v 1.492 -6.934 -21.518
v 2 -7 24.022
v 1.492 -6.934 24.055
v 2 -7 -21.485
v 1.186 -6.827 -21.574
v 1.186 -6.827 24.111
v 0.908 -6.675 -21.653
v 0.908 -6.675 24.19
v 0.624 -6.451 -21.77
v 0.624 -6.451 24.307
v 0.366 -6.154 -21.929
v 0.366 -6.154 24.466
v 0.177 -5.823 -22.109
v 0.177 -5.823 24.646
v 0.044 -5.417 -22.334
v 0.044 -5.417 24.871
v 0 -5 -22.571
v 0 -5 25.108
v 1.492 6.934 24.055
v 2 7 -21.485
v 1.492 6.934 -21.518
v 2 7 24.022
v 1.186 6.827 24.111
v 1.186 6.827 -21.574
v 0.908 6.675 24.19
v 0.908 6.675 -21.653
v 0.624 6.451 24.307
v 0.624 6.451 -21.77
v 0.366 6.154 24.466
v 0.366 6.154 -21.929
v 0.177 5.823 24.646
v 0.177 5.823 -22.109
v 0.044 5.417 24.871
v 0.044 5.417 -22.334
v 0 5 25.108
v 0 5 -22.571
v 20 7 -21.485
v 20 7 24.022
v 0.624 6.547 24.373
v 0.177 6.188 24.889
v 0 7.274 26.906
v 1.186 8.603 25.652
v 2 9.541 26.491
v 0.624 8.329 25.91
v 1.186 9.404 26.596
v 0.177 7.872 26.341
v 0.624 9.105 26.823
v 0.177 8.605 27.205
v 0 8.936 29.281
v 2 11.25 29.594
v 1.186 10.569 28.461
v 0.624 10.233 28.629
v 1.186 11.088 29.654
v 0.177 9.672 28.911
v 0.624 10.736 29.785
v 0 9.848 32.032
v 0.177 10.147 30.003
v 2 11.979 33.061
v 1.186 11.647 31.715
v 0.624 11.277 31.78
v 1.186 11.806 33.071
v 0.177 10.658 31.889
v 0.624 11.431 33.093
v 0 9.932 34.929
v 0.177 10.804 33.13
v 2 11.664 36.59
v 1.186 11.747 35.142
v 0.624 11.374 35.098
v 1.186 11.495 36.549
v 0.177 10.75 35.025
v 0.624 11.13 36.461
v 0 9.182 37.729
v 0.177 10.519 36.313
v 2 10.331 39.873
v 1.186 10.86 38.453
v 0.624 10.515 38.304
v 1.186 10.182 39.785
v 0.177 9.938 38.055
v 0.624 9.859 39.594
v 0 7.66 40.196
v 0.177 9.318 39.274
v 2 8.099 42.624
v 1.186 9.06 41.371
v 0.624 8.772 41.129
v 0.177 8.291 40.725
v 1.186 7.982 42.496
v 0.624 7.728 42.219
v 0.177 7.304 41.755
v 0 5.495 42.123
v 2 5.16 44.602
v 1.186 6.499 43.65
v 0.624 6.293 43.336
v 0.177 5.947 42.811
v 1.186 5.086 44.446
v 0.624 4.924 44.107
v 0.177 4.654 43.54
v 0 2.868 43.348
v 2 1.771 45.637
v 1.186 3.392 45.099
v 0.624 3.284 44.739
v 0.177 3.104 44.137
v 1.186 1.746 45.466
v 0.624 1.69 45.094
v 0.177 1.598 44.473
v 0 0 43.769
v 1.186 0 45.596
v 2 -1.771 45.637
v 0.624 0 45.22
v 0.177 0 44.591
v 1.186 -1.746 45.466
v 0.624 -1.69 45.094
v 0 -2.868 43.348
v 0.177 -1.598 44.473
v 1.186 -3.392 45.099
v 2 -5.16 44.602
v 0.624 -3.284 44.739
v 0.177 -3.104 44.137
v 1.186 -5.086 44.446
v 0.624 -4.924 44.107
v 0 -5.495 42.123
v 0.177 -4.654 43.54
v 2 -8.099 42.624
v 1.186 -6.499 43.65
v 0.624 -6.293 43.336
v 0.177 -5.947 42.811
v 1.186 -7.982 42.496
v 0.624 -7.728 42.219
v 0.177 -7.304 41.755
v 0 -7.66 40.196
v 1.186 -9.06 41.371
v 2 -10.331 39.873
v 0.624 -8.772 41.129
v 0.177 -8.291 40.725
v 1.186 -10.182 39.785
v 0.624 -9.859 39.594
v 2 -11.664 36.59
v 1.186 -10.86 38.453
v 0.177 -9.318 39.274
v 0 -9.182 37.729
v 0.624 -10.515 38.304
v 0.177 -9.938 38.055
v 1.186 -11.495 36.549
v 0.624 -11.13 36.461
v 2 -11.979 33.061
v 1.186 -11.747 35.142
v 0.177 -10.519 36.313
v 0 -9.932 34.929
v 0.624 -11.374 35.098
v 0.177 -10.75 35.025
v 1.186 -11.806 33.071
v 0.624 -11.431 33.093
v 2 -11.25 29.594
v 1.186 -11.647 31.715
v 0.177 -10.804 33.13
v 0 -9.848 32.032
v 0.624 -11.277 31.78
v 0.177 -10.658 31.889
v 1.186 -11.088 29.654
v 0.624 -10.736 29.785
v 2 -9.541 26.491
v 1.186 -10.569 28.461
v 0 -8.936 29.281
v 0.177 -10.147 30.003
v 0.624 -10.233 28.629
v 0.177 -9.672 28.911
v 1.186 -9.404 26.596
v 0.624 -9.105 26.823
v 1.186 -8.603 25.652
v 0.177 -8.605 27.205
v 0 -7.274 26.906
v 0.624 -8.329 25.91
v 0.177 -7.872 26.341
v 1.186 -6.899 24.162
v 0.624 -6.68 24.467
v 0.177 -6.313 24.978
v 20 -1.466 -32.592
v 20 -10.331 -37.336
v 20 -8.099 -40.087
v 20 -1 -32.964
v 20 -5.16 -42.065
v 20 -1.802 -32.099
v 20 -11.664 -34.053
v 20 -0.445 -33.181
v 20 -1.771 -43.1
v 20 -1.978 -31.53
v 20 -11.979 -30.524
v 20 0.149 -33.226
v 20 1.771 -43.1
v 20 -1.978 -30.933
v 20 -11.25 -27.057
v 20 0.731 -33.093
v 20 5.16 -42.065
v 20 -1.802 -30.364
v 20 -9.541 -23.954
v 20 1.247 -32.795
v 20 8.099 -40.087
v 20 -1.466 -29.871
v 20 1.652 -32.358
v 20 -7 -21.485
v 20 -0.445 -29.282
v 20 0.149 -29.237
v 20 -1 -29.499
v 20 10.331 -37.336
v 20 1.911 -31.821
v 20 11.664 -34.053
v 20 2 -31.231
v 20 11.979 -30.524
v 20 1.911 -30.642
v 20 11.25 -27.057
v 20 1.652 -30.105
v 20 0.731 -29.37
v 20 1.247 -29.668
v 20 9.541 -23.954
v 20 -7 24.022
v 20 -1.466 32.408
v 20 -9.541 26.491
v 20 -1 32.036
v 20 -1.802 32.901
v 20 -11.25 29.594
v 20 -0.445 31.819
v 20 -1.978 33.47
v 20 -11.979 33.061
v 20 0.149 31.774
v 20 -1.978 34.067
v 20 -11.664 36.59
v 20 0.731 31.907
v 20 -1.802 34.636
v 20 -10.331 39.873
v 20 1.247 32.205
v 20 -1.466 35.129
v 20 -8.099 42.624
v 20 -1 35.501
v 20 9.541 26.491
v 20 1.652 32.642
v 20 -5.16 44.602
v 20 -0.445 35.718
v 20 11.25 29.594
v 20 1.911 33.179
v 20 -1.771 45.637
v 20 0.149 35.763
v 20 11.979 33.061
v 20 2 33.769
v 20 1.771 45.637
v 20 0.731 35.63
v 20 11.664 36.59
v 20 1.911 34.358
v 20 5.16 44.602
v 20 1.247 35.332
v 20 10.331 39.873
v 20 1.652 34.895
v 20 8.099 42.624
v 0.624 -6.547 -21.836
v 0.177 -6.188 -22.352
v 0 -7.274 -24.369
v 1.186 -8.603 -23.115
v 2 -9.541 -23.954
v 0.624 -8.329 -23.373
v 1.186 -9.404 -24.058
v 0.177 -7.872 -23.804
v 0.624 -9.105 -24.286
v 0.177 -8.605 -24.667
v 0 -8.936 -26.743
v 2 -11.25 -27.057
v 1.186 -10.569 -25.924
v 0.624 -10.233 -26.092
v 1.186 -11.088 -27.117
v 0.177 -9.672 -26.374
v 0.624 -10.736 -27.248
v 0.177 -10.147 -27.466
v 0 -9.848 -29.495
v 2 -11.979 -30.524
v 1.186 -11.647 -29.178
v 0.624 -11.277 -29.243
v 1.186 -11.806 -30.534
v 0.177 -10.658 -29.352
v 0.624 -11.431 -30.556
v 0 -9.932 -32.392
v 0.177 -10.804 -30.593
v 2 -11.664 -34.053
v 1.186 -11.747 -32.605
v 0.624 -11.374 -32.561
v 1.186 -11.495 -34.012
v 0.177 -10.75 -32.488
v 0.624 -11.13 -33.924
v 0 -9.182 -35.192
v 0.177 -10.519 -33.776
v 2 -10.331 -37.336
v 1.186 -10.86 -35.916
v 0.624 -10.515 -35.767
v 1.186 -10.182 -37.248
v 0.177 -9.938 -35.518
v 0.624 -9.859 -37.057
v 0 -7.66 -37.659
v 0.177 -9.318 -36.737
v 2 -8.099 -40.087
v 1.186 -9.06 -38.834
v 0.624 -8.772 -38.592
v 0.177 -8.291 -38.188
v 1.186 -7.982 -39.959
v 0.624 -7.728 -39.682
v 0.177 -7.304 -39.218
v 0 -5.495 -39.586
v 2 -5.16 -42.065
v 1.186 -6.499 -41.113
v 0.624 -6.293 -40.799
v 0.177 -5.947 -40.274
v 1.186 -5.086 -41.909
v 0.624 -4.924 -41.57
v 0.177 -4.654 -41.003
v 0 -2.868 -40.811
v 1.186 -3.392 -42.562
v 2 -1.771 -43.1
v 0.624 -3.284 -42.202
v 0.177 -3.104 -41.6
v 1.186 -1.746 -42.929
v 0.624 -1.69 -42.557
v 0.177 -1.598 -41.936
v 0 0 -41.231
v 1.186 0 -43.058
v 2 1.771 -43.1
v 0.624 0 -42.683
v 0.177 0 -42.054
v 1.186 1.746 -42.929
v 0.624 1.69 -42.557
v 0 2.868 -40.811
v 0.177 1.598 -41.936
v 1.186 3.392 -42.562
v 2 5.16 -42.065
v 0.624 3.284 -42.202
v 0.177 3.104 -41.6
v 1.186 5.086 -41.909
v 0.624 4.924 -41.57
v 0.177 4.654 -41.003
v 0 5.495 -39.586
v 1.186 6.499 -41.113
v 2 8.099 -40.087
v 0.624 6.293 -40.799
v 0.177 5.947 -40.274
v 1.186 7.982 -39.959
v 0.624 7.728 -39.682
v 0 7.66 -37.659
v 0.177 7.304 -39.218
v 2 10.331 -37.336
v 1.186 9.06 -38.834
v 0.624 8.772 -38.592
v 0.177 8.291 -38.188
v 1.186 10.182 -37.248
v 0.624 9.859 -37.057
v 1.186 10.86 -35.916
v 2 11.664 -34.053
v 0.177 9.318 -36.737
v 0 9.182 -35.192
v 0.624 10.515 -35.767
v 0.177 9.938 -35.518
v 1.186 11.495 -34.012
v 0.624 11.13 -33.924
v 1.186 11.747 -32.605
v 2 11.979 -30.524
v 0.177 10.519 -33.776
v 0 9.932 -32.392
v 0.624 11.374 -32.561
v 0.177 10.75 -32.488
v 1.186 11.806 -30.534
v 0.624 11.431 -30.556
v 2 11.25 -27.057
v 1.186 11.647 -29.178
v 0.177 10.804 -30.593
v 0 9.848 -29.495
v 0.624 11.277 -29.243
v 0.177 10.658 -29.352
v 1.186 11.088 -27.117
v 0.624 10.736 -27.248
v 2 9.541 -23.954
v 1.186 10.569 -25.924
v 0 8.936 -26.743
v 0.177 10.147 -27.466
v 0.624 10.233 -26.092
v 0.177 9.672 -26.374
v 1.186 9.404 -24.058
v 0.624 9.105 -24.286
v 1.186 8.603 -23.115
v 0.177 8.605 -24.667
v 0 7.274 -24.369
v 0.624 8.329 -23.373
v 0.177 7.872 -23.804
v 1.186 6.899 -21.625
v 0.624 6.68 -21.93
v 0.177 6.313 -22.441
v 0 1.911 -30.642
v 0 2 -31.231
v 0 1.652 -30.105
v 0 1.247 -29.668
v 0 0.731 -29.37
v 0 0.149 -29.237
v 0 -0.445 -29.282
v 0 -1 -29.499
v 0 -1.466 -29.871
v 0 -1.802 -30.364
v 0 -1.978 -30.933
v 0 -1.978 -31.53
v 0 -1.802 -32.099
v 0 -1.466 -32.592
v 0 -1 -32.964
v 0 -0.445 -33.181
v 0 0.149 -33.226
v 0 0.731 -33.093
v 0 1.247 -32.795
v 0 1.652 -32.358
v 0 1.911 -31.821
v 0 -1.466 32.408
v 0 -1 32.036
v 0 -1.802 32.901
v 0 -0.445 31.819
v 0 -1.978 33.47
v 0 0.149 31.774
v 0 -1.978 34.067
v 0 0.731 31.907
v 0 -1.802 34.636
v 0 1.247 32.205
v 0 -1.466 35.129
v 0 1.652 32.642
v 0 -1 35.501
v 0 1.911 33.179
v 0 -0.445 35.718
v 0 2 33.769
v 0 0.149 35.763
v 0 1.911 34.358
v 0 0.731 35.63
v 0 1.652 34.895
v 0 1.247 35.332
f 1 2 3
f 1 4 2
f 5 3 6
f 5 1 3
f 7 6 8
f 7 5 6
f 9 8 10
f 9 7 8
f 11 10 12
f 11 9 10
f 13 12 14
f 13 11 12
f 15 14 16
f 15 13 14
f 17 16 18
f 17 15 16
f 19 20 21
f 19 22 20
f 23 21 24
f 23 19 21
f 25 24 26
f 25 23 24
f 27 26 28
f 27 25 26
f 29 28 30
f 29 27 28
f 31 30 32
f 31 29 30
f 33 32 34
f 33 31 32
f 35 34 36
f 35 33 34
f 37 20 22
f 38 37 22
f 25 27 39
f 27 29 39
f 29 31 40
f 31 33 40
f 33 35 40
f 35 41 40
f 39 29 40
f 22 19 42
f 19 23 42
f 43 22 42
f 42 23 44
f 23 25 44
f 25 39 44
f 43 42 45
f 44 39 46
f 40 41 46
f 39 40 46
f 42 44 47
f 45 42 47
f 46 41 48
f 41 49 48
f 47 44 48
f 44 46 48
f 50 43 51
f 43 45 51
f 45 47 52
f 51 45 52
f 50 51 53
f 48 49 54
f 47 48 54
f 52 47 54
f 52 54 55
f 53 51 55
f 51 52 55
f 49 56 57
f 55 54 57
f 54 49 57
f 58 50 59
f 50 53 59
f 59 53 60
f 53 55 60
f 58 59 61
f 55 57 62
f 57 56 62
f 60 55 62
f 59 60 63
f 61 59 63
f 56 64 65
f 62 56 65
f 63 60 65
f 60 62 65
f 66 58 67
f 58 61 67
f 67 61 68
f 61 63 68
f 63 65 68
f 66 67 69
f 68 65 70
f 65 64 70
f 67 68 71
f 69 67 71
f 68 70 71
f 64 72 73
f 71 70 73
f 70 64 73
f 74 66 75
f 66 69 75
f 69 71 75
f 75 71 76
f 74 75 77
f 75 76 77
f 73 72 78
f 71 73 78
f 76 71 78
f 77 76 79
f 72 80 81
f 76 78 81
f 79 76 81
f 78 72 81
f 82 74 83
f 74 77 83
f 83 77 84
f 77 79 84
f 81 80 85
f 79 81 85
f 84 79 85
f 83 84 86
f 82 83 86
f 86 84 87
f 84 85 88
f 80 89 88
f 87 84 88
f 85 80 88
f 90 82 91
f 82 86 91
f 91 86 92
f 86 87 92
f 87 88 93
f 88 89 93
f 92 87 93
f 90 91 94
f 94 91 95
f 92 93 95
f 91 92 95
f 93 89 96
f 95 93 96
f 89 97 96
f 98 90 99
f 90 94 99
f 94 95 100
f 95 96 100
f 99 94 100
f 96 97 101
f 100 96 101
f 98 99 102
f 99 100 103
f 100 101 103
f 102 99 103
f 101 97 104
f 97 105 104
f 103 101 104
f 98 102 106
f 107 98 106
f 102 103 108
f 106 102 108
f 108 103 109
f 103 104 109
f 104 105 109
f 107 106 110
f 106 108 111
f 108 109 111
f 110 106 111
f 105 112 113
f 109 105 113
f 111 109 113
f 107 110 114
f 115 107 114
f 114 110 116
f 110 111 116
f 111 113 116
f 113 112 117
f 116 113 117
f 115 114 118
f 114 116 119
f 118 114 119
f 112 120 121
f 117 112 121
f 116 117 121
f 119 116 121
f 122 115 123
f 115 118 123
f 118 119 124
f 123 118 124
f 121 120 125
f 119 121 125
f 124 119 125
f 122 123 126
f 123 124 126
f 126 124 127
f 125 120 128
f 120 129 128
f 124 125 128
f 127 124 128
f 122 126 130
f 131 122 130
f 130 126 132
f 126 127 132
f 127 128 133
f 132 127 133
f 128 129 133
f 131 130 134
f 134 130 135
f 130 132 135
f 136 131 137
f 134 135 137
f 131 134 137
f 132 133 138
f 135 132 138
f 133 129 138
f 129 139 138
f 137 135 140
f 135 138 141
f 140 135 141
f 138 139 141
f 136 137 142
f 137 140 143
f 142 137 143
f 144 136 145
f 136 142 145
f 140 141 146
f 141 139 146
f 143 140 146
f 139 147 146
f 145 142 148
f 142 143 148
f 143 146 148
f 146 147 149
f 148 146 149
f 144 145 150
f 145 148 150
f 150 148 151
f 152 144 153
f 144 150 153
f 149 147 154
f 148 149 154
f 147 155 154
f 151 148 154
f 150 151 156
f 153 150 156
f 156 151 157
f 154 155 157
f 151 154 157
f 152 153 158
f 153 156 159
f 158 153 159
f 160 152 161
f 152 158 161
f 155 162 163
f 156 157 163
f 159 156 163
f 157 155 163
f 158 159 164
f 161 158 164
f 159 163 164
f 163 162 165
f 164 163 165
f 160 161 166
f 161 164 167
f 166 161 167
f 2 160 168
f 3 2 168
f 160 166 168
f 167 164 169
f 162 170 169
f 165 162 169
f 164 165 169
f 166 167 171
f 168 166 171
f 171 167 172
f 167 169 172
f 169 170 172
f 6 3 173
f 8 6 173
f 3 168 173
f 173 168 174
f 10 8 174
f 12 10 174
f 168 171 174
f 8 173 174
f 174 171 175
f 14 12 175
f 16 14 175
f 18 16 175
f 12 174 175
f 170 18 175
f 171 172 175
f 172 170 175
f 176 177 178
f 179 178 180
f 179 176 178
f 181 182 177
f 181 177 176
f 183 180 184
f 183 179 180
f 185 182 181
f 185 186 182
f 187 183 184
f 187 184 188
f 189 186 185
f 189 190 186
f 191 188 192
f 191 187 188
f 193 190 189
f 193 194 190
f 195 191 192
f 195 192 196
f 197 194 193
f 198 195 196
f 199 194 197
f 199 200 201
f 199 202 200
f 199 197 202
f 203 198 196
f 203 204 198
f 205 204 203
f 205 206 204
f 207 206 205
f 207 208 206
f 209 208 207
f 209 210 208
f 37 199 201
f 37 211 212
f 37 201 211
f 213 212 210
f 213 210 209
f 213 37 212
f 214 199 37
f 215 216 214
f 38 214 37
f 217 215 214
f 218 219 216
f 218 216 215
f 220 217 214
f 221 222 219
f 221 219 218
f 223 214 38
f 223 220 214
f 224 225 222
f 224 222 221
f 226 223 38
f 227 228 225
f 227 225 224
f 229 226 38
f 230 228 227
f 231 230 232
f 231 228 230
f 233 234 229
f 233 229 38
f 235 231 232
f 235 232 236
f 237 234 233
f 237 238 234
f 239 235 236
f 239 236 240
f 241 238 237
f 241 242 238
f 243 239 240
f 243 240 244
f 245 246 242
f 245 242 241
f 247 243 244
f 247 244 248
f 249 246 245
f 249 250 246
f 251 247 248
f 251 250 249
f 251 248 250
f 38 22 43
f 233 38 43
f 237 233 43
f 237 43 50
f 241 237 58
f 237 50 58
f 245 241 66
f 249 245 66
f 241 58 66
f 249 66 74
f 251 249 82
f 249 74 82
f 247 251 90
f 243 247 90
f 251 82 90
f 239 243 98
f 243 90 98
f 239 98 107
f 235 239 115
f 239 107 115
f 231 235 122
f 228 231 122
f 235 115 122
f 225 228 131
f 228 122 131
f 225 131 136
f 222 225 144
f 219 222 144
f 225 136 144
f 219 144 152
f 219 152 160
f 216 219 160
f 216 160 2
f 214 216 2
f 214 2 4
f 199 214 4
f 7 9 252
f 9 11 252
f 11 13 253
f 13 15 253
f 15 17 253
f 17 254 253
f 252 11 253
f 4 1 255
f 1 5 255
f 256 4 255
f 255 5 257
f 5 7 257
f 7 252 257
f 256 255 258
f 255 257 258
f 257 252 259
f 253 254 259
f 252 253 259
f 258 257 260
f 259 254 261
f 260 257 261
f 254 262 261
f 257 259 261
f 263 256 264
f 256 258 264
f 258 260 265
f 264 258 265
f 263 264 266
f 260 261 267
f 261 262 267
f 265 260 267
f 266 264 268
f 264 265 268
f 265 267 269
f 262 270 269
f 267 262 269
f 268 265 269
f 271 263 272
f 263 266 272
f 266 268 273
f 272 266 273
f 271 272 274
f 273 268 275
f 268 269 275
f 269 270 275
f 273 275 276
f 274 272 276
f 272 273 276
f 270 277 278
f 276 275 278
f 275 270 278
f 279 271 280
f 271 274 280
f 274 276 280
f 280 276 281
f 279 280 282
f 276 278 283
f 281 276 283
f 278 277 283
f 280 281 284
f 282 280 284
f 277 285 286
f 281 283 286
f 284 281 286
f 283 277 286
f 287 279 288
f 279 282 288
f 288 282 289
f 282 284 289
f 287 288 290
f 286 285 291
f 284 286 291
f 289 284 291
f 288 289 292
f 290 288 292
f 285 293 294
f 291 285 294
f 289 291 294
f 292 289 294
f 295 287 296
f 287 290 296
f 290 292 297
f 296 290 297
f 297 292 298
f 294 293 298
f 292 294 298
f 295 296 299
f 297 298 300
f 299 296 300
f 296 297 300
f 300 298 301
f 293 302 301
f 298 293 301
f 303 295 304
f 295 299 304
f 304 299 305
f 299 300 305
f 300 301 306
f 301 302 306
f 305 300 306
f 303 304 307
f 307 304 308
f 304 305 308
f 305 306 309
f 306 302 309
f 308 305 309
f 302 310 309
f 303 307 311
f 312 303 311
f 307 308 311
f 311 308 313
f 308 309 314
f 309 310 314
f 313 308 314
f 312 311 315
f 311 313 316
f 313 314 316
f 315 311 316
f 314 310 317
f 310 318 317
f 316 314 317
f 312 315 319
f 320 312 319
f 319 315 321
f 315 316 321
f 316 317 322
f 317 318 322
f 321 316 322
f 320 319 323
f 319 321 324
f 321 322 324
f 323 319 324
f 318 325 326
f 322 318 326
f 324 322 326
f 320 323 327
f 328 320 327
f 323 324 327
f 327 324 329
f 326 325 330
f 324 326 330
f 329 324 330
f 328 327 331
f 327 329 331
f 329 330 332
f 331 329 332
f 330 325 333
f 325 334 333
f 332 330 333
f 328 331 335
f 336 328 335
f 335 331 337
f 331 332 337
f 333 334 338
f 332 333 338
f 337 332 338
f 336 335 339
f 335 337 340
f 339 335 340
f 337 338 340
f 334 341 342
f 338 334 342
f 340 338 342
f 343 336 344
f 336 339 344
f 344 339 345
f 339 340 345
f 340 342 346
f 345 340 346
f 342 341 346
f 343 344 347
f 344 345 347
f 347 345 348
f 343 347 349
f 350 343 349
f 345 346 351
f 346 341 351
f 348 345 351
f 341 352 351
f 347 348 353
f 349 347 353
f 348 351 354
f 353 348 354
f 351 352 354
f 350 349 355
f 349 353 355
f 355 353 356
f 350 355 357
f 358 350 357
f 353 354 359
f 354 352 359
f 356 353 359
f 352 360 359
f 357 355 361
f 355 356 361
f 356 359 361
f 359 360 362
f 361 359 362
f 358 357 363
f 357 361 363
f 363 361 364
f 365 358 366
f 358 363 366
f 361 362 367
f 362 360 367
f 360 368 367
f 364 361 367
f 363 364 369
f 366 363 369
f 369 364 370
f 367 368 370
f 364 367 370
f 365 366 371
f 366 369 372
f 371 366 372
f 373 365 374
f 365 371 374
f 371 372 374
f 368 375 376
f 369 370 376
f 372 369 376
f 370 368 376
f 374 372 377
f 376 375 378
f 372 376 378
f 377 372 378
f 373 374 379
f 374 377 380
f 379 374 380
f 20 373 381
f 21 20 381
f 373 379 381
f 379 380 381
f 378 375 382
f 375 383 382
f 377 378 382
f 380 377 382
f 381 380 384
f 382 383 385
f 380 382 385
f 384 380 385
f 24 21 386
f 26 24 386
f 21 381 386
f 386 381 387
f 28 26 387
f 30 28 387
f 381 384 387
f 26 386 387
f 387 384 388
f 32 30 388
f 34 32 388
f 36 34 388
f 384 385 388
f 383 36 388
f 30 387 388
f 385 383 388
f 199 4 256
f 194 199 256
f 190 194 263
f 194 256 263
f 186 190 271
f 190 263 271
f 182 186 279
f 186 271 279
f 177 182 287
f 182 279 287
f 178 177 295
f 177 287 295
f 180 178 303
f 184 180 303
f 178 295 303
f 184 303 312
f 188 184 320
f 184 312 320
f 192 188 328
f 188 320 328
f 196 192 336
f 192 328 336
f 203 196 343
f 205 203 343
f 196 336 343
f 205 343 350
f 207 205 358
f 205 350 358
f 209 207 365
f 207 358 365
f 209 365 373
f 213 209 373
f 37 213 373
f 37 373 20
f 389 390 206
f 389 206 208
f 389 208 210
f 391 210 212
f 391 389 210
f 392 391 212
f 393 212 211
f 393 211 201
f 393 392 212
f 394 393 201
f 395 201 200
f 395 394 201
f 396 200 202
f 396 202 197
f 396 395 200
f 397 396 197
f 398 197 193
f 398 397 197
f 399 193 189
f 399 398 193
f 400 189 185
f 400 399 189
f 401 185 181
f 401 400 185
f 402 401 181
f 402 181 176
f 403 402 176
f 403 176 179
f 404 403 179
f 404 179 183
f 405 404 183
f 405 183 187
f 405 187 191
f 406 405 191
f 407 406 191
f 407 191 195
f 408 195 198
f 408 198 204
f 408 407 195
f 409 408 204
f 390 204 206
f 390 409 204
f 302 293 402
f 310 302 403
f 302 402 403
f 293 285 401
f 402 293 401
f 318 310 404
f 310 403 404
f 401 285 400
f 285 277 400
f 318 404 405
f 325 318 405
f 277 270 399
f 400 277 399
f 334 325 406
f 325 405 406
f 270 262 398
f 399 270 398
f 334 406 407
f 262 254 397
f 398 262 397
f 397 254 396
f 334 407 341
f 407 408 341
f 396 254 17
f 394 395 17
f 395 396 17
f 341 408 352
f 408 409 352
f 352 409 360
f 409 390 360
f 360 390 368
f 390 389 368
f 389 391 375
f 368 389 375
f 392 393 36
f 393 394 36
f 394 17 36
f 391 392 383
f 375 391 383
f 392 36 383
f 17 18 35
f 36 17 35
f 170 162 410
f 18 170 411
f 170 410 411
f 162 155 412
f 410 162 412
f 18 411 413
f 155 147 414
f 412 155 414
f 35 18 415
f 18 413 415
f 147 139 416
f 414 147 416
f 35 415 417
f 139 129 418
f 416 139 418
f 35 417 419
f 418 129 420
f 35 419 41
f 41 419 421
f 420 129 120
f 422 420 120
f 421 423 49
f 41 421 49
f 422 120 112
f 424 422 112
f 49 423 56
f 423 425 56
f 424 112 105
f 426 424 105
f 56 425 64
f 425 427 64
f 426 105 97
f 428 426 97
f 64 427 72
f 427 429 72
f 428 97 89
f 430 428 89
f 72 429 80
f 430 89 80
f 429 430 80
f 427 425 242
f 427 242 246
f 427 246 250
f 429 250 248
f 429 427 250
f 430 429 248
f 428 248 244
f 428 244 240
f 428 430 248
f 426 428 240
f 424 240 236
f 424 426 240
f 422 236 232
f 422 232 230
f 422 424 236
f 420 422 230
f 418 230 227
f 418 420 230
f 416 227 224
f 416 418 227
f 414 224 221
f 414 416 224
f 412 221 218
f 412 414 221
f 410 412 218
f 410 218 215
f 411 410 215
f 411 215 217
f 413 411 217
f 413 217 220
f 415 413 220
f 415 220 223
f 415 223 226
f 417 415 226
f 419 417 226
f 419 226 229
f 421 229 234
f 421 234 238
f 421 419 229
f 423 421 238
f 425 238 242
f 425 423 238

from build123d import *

# Parameters (mm, degrees)
F0_R     = 2
F1_DEPTH = 20
F2_R     = 2


with BuildPart() as f1:
    # F0 (on Right) → F1 (new body)
    with BuildSketch(Plane.YZ):
        with BuildLine():
            ThreePointArc((7, 24.021733), (0, 45.768528), (-7, 24.021733))
            Line((-7, 24.021733), (-7, -21.484678))
            ThreePointArc((-7, -21.484678), (0, -43.231472), (7, -21.484678))
            Line((7, -21.484678), (7, 24.021733))
        make_face()
        with Locations((0, -31.231472)):
            Circle(F0_R, mode=Mode.SUBTRACT)
        with Locations((0, 33.768528)):
            Circle(F0_R, mode=Mode.SUBTRACT)
    extrude(amount=F1_DEPTH)

    # F2
    f2_edges = [f1.edges().sort_by_distance(p)[0] for p in [
        (0, -7, 1.268528),
        (0, 0, -43.231472),
        (0, 7, 1.268528),
        (0, 0, 45.768528),
    ]]
    fillet(f2_edges, radius=F2_R)


solid = f1.part
